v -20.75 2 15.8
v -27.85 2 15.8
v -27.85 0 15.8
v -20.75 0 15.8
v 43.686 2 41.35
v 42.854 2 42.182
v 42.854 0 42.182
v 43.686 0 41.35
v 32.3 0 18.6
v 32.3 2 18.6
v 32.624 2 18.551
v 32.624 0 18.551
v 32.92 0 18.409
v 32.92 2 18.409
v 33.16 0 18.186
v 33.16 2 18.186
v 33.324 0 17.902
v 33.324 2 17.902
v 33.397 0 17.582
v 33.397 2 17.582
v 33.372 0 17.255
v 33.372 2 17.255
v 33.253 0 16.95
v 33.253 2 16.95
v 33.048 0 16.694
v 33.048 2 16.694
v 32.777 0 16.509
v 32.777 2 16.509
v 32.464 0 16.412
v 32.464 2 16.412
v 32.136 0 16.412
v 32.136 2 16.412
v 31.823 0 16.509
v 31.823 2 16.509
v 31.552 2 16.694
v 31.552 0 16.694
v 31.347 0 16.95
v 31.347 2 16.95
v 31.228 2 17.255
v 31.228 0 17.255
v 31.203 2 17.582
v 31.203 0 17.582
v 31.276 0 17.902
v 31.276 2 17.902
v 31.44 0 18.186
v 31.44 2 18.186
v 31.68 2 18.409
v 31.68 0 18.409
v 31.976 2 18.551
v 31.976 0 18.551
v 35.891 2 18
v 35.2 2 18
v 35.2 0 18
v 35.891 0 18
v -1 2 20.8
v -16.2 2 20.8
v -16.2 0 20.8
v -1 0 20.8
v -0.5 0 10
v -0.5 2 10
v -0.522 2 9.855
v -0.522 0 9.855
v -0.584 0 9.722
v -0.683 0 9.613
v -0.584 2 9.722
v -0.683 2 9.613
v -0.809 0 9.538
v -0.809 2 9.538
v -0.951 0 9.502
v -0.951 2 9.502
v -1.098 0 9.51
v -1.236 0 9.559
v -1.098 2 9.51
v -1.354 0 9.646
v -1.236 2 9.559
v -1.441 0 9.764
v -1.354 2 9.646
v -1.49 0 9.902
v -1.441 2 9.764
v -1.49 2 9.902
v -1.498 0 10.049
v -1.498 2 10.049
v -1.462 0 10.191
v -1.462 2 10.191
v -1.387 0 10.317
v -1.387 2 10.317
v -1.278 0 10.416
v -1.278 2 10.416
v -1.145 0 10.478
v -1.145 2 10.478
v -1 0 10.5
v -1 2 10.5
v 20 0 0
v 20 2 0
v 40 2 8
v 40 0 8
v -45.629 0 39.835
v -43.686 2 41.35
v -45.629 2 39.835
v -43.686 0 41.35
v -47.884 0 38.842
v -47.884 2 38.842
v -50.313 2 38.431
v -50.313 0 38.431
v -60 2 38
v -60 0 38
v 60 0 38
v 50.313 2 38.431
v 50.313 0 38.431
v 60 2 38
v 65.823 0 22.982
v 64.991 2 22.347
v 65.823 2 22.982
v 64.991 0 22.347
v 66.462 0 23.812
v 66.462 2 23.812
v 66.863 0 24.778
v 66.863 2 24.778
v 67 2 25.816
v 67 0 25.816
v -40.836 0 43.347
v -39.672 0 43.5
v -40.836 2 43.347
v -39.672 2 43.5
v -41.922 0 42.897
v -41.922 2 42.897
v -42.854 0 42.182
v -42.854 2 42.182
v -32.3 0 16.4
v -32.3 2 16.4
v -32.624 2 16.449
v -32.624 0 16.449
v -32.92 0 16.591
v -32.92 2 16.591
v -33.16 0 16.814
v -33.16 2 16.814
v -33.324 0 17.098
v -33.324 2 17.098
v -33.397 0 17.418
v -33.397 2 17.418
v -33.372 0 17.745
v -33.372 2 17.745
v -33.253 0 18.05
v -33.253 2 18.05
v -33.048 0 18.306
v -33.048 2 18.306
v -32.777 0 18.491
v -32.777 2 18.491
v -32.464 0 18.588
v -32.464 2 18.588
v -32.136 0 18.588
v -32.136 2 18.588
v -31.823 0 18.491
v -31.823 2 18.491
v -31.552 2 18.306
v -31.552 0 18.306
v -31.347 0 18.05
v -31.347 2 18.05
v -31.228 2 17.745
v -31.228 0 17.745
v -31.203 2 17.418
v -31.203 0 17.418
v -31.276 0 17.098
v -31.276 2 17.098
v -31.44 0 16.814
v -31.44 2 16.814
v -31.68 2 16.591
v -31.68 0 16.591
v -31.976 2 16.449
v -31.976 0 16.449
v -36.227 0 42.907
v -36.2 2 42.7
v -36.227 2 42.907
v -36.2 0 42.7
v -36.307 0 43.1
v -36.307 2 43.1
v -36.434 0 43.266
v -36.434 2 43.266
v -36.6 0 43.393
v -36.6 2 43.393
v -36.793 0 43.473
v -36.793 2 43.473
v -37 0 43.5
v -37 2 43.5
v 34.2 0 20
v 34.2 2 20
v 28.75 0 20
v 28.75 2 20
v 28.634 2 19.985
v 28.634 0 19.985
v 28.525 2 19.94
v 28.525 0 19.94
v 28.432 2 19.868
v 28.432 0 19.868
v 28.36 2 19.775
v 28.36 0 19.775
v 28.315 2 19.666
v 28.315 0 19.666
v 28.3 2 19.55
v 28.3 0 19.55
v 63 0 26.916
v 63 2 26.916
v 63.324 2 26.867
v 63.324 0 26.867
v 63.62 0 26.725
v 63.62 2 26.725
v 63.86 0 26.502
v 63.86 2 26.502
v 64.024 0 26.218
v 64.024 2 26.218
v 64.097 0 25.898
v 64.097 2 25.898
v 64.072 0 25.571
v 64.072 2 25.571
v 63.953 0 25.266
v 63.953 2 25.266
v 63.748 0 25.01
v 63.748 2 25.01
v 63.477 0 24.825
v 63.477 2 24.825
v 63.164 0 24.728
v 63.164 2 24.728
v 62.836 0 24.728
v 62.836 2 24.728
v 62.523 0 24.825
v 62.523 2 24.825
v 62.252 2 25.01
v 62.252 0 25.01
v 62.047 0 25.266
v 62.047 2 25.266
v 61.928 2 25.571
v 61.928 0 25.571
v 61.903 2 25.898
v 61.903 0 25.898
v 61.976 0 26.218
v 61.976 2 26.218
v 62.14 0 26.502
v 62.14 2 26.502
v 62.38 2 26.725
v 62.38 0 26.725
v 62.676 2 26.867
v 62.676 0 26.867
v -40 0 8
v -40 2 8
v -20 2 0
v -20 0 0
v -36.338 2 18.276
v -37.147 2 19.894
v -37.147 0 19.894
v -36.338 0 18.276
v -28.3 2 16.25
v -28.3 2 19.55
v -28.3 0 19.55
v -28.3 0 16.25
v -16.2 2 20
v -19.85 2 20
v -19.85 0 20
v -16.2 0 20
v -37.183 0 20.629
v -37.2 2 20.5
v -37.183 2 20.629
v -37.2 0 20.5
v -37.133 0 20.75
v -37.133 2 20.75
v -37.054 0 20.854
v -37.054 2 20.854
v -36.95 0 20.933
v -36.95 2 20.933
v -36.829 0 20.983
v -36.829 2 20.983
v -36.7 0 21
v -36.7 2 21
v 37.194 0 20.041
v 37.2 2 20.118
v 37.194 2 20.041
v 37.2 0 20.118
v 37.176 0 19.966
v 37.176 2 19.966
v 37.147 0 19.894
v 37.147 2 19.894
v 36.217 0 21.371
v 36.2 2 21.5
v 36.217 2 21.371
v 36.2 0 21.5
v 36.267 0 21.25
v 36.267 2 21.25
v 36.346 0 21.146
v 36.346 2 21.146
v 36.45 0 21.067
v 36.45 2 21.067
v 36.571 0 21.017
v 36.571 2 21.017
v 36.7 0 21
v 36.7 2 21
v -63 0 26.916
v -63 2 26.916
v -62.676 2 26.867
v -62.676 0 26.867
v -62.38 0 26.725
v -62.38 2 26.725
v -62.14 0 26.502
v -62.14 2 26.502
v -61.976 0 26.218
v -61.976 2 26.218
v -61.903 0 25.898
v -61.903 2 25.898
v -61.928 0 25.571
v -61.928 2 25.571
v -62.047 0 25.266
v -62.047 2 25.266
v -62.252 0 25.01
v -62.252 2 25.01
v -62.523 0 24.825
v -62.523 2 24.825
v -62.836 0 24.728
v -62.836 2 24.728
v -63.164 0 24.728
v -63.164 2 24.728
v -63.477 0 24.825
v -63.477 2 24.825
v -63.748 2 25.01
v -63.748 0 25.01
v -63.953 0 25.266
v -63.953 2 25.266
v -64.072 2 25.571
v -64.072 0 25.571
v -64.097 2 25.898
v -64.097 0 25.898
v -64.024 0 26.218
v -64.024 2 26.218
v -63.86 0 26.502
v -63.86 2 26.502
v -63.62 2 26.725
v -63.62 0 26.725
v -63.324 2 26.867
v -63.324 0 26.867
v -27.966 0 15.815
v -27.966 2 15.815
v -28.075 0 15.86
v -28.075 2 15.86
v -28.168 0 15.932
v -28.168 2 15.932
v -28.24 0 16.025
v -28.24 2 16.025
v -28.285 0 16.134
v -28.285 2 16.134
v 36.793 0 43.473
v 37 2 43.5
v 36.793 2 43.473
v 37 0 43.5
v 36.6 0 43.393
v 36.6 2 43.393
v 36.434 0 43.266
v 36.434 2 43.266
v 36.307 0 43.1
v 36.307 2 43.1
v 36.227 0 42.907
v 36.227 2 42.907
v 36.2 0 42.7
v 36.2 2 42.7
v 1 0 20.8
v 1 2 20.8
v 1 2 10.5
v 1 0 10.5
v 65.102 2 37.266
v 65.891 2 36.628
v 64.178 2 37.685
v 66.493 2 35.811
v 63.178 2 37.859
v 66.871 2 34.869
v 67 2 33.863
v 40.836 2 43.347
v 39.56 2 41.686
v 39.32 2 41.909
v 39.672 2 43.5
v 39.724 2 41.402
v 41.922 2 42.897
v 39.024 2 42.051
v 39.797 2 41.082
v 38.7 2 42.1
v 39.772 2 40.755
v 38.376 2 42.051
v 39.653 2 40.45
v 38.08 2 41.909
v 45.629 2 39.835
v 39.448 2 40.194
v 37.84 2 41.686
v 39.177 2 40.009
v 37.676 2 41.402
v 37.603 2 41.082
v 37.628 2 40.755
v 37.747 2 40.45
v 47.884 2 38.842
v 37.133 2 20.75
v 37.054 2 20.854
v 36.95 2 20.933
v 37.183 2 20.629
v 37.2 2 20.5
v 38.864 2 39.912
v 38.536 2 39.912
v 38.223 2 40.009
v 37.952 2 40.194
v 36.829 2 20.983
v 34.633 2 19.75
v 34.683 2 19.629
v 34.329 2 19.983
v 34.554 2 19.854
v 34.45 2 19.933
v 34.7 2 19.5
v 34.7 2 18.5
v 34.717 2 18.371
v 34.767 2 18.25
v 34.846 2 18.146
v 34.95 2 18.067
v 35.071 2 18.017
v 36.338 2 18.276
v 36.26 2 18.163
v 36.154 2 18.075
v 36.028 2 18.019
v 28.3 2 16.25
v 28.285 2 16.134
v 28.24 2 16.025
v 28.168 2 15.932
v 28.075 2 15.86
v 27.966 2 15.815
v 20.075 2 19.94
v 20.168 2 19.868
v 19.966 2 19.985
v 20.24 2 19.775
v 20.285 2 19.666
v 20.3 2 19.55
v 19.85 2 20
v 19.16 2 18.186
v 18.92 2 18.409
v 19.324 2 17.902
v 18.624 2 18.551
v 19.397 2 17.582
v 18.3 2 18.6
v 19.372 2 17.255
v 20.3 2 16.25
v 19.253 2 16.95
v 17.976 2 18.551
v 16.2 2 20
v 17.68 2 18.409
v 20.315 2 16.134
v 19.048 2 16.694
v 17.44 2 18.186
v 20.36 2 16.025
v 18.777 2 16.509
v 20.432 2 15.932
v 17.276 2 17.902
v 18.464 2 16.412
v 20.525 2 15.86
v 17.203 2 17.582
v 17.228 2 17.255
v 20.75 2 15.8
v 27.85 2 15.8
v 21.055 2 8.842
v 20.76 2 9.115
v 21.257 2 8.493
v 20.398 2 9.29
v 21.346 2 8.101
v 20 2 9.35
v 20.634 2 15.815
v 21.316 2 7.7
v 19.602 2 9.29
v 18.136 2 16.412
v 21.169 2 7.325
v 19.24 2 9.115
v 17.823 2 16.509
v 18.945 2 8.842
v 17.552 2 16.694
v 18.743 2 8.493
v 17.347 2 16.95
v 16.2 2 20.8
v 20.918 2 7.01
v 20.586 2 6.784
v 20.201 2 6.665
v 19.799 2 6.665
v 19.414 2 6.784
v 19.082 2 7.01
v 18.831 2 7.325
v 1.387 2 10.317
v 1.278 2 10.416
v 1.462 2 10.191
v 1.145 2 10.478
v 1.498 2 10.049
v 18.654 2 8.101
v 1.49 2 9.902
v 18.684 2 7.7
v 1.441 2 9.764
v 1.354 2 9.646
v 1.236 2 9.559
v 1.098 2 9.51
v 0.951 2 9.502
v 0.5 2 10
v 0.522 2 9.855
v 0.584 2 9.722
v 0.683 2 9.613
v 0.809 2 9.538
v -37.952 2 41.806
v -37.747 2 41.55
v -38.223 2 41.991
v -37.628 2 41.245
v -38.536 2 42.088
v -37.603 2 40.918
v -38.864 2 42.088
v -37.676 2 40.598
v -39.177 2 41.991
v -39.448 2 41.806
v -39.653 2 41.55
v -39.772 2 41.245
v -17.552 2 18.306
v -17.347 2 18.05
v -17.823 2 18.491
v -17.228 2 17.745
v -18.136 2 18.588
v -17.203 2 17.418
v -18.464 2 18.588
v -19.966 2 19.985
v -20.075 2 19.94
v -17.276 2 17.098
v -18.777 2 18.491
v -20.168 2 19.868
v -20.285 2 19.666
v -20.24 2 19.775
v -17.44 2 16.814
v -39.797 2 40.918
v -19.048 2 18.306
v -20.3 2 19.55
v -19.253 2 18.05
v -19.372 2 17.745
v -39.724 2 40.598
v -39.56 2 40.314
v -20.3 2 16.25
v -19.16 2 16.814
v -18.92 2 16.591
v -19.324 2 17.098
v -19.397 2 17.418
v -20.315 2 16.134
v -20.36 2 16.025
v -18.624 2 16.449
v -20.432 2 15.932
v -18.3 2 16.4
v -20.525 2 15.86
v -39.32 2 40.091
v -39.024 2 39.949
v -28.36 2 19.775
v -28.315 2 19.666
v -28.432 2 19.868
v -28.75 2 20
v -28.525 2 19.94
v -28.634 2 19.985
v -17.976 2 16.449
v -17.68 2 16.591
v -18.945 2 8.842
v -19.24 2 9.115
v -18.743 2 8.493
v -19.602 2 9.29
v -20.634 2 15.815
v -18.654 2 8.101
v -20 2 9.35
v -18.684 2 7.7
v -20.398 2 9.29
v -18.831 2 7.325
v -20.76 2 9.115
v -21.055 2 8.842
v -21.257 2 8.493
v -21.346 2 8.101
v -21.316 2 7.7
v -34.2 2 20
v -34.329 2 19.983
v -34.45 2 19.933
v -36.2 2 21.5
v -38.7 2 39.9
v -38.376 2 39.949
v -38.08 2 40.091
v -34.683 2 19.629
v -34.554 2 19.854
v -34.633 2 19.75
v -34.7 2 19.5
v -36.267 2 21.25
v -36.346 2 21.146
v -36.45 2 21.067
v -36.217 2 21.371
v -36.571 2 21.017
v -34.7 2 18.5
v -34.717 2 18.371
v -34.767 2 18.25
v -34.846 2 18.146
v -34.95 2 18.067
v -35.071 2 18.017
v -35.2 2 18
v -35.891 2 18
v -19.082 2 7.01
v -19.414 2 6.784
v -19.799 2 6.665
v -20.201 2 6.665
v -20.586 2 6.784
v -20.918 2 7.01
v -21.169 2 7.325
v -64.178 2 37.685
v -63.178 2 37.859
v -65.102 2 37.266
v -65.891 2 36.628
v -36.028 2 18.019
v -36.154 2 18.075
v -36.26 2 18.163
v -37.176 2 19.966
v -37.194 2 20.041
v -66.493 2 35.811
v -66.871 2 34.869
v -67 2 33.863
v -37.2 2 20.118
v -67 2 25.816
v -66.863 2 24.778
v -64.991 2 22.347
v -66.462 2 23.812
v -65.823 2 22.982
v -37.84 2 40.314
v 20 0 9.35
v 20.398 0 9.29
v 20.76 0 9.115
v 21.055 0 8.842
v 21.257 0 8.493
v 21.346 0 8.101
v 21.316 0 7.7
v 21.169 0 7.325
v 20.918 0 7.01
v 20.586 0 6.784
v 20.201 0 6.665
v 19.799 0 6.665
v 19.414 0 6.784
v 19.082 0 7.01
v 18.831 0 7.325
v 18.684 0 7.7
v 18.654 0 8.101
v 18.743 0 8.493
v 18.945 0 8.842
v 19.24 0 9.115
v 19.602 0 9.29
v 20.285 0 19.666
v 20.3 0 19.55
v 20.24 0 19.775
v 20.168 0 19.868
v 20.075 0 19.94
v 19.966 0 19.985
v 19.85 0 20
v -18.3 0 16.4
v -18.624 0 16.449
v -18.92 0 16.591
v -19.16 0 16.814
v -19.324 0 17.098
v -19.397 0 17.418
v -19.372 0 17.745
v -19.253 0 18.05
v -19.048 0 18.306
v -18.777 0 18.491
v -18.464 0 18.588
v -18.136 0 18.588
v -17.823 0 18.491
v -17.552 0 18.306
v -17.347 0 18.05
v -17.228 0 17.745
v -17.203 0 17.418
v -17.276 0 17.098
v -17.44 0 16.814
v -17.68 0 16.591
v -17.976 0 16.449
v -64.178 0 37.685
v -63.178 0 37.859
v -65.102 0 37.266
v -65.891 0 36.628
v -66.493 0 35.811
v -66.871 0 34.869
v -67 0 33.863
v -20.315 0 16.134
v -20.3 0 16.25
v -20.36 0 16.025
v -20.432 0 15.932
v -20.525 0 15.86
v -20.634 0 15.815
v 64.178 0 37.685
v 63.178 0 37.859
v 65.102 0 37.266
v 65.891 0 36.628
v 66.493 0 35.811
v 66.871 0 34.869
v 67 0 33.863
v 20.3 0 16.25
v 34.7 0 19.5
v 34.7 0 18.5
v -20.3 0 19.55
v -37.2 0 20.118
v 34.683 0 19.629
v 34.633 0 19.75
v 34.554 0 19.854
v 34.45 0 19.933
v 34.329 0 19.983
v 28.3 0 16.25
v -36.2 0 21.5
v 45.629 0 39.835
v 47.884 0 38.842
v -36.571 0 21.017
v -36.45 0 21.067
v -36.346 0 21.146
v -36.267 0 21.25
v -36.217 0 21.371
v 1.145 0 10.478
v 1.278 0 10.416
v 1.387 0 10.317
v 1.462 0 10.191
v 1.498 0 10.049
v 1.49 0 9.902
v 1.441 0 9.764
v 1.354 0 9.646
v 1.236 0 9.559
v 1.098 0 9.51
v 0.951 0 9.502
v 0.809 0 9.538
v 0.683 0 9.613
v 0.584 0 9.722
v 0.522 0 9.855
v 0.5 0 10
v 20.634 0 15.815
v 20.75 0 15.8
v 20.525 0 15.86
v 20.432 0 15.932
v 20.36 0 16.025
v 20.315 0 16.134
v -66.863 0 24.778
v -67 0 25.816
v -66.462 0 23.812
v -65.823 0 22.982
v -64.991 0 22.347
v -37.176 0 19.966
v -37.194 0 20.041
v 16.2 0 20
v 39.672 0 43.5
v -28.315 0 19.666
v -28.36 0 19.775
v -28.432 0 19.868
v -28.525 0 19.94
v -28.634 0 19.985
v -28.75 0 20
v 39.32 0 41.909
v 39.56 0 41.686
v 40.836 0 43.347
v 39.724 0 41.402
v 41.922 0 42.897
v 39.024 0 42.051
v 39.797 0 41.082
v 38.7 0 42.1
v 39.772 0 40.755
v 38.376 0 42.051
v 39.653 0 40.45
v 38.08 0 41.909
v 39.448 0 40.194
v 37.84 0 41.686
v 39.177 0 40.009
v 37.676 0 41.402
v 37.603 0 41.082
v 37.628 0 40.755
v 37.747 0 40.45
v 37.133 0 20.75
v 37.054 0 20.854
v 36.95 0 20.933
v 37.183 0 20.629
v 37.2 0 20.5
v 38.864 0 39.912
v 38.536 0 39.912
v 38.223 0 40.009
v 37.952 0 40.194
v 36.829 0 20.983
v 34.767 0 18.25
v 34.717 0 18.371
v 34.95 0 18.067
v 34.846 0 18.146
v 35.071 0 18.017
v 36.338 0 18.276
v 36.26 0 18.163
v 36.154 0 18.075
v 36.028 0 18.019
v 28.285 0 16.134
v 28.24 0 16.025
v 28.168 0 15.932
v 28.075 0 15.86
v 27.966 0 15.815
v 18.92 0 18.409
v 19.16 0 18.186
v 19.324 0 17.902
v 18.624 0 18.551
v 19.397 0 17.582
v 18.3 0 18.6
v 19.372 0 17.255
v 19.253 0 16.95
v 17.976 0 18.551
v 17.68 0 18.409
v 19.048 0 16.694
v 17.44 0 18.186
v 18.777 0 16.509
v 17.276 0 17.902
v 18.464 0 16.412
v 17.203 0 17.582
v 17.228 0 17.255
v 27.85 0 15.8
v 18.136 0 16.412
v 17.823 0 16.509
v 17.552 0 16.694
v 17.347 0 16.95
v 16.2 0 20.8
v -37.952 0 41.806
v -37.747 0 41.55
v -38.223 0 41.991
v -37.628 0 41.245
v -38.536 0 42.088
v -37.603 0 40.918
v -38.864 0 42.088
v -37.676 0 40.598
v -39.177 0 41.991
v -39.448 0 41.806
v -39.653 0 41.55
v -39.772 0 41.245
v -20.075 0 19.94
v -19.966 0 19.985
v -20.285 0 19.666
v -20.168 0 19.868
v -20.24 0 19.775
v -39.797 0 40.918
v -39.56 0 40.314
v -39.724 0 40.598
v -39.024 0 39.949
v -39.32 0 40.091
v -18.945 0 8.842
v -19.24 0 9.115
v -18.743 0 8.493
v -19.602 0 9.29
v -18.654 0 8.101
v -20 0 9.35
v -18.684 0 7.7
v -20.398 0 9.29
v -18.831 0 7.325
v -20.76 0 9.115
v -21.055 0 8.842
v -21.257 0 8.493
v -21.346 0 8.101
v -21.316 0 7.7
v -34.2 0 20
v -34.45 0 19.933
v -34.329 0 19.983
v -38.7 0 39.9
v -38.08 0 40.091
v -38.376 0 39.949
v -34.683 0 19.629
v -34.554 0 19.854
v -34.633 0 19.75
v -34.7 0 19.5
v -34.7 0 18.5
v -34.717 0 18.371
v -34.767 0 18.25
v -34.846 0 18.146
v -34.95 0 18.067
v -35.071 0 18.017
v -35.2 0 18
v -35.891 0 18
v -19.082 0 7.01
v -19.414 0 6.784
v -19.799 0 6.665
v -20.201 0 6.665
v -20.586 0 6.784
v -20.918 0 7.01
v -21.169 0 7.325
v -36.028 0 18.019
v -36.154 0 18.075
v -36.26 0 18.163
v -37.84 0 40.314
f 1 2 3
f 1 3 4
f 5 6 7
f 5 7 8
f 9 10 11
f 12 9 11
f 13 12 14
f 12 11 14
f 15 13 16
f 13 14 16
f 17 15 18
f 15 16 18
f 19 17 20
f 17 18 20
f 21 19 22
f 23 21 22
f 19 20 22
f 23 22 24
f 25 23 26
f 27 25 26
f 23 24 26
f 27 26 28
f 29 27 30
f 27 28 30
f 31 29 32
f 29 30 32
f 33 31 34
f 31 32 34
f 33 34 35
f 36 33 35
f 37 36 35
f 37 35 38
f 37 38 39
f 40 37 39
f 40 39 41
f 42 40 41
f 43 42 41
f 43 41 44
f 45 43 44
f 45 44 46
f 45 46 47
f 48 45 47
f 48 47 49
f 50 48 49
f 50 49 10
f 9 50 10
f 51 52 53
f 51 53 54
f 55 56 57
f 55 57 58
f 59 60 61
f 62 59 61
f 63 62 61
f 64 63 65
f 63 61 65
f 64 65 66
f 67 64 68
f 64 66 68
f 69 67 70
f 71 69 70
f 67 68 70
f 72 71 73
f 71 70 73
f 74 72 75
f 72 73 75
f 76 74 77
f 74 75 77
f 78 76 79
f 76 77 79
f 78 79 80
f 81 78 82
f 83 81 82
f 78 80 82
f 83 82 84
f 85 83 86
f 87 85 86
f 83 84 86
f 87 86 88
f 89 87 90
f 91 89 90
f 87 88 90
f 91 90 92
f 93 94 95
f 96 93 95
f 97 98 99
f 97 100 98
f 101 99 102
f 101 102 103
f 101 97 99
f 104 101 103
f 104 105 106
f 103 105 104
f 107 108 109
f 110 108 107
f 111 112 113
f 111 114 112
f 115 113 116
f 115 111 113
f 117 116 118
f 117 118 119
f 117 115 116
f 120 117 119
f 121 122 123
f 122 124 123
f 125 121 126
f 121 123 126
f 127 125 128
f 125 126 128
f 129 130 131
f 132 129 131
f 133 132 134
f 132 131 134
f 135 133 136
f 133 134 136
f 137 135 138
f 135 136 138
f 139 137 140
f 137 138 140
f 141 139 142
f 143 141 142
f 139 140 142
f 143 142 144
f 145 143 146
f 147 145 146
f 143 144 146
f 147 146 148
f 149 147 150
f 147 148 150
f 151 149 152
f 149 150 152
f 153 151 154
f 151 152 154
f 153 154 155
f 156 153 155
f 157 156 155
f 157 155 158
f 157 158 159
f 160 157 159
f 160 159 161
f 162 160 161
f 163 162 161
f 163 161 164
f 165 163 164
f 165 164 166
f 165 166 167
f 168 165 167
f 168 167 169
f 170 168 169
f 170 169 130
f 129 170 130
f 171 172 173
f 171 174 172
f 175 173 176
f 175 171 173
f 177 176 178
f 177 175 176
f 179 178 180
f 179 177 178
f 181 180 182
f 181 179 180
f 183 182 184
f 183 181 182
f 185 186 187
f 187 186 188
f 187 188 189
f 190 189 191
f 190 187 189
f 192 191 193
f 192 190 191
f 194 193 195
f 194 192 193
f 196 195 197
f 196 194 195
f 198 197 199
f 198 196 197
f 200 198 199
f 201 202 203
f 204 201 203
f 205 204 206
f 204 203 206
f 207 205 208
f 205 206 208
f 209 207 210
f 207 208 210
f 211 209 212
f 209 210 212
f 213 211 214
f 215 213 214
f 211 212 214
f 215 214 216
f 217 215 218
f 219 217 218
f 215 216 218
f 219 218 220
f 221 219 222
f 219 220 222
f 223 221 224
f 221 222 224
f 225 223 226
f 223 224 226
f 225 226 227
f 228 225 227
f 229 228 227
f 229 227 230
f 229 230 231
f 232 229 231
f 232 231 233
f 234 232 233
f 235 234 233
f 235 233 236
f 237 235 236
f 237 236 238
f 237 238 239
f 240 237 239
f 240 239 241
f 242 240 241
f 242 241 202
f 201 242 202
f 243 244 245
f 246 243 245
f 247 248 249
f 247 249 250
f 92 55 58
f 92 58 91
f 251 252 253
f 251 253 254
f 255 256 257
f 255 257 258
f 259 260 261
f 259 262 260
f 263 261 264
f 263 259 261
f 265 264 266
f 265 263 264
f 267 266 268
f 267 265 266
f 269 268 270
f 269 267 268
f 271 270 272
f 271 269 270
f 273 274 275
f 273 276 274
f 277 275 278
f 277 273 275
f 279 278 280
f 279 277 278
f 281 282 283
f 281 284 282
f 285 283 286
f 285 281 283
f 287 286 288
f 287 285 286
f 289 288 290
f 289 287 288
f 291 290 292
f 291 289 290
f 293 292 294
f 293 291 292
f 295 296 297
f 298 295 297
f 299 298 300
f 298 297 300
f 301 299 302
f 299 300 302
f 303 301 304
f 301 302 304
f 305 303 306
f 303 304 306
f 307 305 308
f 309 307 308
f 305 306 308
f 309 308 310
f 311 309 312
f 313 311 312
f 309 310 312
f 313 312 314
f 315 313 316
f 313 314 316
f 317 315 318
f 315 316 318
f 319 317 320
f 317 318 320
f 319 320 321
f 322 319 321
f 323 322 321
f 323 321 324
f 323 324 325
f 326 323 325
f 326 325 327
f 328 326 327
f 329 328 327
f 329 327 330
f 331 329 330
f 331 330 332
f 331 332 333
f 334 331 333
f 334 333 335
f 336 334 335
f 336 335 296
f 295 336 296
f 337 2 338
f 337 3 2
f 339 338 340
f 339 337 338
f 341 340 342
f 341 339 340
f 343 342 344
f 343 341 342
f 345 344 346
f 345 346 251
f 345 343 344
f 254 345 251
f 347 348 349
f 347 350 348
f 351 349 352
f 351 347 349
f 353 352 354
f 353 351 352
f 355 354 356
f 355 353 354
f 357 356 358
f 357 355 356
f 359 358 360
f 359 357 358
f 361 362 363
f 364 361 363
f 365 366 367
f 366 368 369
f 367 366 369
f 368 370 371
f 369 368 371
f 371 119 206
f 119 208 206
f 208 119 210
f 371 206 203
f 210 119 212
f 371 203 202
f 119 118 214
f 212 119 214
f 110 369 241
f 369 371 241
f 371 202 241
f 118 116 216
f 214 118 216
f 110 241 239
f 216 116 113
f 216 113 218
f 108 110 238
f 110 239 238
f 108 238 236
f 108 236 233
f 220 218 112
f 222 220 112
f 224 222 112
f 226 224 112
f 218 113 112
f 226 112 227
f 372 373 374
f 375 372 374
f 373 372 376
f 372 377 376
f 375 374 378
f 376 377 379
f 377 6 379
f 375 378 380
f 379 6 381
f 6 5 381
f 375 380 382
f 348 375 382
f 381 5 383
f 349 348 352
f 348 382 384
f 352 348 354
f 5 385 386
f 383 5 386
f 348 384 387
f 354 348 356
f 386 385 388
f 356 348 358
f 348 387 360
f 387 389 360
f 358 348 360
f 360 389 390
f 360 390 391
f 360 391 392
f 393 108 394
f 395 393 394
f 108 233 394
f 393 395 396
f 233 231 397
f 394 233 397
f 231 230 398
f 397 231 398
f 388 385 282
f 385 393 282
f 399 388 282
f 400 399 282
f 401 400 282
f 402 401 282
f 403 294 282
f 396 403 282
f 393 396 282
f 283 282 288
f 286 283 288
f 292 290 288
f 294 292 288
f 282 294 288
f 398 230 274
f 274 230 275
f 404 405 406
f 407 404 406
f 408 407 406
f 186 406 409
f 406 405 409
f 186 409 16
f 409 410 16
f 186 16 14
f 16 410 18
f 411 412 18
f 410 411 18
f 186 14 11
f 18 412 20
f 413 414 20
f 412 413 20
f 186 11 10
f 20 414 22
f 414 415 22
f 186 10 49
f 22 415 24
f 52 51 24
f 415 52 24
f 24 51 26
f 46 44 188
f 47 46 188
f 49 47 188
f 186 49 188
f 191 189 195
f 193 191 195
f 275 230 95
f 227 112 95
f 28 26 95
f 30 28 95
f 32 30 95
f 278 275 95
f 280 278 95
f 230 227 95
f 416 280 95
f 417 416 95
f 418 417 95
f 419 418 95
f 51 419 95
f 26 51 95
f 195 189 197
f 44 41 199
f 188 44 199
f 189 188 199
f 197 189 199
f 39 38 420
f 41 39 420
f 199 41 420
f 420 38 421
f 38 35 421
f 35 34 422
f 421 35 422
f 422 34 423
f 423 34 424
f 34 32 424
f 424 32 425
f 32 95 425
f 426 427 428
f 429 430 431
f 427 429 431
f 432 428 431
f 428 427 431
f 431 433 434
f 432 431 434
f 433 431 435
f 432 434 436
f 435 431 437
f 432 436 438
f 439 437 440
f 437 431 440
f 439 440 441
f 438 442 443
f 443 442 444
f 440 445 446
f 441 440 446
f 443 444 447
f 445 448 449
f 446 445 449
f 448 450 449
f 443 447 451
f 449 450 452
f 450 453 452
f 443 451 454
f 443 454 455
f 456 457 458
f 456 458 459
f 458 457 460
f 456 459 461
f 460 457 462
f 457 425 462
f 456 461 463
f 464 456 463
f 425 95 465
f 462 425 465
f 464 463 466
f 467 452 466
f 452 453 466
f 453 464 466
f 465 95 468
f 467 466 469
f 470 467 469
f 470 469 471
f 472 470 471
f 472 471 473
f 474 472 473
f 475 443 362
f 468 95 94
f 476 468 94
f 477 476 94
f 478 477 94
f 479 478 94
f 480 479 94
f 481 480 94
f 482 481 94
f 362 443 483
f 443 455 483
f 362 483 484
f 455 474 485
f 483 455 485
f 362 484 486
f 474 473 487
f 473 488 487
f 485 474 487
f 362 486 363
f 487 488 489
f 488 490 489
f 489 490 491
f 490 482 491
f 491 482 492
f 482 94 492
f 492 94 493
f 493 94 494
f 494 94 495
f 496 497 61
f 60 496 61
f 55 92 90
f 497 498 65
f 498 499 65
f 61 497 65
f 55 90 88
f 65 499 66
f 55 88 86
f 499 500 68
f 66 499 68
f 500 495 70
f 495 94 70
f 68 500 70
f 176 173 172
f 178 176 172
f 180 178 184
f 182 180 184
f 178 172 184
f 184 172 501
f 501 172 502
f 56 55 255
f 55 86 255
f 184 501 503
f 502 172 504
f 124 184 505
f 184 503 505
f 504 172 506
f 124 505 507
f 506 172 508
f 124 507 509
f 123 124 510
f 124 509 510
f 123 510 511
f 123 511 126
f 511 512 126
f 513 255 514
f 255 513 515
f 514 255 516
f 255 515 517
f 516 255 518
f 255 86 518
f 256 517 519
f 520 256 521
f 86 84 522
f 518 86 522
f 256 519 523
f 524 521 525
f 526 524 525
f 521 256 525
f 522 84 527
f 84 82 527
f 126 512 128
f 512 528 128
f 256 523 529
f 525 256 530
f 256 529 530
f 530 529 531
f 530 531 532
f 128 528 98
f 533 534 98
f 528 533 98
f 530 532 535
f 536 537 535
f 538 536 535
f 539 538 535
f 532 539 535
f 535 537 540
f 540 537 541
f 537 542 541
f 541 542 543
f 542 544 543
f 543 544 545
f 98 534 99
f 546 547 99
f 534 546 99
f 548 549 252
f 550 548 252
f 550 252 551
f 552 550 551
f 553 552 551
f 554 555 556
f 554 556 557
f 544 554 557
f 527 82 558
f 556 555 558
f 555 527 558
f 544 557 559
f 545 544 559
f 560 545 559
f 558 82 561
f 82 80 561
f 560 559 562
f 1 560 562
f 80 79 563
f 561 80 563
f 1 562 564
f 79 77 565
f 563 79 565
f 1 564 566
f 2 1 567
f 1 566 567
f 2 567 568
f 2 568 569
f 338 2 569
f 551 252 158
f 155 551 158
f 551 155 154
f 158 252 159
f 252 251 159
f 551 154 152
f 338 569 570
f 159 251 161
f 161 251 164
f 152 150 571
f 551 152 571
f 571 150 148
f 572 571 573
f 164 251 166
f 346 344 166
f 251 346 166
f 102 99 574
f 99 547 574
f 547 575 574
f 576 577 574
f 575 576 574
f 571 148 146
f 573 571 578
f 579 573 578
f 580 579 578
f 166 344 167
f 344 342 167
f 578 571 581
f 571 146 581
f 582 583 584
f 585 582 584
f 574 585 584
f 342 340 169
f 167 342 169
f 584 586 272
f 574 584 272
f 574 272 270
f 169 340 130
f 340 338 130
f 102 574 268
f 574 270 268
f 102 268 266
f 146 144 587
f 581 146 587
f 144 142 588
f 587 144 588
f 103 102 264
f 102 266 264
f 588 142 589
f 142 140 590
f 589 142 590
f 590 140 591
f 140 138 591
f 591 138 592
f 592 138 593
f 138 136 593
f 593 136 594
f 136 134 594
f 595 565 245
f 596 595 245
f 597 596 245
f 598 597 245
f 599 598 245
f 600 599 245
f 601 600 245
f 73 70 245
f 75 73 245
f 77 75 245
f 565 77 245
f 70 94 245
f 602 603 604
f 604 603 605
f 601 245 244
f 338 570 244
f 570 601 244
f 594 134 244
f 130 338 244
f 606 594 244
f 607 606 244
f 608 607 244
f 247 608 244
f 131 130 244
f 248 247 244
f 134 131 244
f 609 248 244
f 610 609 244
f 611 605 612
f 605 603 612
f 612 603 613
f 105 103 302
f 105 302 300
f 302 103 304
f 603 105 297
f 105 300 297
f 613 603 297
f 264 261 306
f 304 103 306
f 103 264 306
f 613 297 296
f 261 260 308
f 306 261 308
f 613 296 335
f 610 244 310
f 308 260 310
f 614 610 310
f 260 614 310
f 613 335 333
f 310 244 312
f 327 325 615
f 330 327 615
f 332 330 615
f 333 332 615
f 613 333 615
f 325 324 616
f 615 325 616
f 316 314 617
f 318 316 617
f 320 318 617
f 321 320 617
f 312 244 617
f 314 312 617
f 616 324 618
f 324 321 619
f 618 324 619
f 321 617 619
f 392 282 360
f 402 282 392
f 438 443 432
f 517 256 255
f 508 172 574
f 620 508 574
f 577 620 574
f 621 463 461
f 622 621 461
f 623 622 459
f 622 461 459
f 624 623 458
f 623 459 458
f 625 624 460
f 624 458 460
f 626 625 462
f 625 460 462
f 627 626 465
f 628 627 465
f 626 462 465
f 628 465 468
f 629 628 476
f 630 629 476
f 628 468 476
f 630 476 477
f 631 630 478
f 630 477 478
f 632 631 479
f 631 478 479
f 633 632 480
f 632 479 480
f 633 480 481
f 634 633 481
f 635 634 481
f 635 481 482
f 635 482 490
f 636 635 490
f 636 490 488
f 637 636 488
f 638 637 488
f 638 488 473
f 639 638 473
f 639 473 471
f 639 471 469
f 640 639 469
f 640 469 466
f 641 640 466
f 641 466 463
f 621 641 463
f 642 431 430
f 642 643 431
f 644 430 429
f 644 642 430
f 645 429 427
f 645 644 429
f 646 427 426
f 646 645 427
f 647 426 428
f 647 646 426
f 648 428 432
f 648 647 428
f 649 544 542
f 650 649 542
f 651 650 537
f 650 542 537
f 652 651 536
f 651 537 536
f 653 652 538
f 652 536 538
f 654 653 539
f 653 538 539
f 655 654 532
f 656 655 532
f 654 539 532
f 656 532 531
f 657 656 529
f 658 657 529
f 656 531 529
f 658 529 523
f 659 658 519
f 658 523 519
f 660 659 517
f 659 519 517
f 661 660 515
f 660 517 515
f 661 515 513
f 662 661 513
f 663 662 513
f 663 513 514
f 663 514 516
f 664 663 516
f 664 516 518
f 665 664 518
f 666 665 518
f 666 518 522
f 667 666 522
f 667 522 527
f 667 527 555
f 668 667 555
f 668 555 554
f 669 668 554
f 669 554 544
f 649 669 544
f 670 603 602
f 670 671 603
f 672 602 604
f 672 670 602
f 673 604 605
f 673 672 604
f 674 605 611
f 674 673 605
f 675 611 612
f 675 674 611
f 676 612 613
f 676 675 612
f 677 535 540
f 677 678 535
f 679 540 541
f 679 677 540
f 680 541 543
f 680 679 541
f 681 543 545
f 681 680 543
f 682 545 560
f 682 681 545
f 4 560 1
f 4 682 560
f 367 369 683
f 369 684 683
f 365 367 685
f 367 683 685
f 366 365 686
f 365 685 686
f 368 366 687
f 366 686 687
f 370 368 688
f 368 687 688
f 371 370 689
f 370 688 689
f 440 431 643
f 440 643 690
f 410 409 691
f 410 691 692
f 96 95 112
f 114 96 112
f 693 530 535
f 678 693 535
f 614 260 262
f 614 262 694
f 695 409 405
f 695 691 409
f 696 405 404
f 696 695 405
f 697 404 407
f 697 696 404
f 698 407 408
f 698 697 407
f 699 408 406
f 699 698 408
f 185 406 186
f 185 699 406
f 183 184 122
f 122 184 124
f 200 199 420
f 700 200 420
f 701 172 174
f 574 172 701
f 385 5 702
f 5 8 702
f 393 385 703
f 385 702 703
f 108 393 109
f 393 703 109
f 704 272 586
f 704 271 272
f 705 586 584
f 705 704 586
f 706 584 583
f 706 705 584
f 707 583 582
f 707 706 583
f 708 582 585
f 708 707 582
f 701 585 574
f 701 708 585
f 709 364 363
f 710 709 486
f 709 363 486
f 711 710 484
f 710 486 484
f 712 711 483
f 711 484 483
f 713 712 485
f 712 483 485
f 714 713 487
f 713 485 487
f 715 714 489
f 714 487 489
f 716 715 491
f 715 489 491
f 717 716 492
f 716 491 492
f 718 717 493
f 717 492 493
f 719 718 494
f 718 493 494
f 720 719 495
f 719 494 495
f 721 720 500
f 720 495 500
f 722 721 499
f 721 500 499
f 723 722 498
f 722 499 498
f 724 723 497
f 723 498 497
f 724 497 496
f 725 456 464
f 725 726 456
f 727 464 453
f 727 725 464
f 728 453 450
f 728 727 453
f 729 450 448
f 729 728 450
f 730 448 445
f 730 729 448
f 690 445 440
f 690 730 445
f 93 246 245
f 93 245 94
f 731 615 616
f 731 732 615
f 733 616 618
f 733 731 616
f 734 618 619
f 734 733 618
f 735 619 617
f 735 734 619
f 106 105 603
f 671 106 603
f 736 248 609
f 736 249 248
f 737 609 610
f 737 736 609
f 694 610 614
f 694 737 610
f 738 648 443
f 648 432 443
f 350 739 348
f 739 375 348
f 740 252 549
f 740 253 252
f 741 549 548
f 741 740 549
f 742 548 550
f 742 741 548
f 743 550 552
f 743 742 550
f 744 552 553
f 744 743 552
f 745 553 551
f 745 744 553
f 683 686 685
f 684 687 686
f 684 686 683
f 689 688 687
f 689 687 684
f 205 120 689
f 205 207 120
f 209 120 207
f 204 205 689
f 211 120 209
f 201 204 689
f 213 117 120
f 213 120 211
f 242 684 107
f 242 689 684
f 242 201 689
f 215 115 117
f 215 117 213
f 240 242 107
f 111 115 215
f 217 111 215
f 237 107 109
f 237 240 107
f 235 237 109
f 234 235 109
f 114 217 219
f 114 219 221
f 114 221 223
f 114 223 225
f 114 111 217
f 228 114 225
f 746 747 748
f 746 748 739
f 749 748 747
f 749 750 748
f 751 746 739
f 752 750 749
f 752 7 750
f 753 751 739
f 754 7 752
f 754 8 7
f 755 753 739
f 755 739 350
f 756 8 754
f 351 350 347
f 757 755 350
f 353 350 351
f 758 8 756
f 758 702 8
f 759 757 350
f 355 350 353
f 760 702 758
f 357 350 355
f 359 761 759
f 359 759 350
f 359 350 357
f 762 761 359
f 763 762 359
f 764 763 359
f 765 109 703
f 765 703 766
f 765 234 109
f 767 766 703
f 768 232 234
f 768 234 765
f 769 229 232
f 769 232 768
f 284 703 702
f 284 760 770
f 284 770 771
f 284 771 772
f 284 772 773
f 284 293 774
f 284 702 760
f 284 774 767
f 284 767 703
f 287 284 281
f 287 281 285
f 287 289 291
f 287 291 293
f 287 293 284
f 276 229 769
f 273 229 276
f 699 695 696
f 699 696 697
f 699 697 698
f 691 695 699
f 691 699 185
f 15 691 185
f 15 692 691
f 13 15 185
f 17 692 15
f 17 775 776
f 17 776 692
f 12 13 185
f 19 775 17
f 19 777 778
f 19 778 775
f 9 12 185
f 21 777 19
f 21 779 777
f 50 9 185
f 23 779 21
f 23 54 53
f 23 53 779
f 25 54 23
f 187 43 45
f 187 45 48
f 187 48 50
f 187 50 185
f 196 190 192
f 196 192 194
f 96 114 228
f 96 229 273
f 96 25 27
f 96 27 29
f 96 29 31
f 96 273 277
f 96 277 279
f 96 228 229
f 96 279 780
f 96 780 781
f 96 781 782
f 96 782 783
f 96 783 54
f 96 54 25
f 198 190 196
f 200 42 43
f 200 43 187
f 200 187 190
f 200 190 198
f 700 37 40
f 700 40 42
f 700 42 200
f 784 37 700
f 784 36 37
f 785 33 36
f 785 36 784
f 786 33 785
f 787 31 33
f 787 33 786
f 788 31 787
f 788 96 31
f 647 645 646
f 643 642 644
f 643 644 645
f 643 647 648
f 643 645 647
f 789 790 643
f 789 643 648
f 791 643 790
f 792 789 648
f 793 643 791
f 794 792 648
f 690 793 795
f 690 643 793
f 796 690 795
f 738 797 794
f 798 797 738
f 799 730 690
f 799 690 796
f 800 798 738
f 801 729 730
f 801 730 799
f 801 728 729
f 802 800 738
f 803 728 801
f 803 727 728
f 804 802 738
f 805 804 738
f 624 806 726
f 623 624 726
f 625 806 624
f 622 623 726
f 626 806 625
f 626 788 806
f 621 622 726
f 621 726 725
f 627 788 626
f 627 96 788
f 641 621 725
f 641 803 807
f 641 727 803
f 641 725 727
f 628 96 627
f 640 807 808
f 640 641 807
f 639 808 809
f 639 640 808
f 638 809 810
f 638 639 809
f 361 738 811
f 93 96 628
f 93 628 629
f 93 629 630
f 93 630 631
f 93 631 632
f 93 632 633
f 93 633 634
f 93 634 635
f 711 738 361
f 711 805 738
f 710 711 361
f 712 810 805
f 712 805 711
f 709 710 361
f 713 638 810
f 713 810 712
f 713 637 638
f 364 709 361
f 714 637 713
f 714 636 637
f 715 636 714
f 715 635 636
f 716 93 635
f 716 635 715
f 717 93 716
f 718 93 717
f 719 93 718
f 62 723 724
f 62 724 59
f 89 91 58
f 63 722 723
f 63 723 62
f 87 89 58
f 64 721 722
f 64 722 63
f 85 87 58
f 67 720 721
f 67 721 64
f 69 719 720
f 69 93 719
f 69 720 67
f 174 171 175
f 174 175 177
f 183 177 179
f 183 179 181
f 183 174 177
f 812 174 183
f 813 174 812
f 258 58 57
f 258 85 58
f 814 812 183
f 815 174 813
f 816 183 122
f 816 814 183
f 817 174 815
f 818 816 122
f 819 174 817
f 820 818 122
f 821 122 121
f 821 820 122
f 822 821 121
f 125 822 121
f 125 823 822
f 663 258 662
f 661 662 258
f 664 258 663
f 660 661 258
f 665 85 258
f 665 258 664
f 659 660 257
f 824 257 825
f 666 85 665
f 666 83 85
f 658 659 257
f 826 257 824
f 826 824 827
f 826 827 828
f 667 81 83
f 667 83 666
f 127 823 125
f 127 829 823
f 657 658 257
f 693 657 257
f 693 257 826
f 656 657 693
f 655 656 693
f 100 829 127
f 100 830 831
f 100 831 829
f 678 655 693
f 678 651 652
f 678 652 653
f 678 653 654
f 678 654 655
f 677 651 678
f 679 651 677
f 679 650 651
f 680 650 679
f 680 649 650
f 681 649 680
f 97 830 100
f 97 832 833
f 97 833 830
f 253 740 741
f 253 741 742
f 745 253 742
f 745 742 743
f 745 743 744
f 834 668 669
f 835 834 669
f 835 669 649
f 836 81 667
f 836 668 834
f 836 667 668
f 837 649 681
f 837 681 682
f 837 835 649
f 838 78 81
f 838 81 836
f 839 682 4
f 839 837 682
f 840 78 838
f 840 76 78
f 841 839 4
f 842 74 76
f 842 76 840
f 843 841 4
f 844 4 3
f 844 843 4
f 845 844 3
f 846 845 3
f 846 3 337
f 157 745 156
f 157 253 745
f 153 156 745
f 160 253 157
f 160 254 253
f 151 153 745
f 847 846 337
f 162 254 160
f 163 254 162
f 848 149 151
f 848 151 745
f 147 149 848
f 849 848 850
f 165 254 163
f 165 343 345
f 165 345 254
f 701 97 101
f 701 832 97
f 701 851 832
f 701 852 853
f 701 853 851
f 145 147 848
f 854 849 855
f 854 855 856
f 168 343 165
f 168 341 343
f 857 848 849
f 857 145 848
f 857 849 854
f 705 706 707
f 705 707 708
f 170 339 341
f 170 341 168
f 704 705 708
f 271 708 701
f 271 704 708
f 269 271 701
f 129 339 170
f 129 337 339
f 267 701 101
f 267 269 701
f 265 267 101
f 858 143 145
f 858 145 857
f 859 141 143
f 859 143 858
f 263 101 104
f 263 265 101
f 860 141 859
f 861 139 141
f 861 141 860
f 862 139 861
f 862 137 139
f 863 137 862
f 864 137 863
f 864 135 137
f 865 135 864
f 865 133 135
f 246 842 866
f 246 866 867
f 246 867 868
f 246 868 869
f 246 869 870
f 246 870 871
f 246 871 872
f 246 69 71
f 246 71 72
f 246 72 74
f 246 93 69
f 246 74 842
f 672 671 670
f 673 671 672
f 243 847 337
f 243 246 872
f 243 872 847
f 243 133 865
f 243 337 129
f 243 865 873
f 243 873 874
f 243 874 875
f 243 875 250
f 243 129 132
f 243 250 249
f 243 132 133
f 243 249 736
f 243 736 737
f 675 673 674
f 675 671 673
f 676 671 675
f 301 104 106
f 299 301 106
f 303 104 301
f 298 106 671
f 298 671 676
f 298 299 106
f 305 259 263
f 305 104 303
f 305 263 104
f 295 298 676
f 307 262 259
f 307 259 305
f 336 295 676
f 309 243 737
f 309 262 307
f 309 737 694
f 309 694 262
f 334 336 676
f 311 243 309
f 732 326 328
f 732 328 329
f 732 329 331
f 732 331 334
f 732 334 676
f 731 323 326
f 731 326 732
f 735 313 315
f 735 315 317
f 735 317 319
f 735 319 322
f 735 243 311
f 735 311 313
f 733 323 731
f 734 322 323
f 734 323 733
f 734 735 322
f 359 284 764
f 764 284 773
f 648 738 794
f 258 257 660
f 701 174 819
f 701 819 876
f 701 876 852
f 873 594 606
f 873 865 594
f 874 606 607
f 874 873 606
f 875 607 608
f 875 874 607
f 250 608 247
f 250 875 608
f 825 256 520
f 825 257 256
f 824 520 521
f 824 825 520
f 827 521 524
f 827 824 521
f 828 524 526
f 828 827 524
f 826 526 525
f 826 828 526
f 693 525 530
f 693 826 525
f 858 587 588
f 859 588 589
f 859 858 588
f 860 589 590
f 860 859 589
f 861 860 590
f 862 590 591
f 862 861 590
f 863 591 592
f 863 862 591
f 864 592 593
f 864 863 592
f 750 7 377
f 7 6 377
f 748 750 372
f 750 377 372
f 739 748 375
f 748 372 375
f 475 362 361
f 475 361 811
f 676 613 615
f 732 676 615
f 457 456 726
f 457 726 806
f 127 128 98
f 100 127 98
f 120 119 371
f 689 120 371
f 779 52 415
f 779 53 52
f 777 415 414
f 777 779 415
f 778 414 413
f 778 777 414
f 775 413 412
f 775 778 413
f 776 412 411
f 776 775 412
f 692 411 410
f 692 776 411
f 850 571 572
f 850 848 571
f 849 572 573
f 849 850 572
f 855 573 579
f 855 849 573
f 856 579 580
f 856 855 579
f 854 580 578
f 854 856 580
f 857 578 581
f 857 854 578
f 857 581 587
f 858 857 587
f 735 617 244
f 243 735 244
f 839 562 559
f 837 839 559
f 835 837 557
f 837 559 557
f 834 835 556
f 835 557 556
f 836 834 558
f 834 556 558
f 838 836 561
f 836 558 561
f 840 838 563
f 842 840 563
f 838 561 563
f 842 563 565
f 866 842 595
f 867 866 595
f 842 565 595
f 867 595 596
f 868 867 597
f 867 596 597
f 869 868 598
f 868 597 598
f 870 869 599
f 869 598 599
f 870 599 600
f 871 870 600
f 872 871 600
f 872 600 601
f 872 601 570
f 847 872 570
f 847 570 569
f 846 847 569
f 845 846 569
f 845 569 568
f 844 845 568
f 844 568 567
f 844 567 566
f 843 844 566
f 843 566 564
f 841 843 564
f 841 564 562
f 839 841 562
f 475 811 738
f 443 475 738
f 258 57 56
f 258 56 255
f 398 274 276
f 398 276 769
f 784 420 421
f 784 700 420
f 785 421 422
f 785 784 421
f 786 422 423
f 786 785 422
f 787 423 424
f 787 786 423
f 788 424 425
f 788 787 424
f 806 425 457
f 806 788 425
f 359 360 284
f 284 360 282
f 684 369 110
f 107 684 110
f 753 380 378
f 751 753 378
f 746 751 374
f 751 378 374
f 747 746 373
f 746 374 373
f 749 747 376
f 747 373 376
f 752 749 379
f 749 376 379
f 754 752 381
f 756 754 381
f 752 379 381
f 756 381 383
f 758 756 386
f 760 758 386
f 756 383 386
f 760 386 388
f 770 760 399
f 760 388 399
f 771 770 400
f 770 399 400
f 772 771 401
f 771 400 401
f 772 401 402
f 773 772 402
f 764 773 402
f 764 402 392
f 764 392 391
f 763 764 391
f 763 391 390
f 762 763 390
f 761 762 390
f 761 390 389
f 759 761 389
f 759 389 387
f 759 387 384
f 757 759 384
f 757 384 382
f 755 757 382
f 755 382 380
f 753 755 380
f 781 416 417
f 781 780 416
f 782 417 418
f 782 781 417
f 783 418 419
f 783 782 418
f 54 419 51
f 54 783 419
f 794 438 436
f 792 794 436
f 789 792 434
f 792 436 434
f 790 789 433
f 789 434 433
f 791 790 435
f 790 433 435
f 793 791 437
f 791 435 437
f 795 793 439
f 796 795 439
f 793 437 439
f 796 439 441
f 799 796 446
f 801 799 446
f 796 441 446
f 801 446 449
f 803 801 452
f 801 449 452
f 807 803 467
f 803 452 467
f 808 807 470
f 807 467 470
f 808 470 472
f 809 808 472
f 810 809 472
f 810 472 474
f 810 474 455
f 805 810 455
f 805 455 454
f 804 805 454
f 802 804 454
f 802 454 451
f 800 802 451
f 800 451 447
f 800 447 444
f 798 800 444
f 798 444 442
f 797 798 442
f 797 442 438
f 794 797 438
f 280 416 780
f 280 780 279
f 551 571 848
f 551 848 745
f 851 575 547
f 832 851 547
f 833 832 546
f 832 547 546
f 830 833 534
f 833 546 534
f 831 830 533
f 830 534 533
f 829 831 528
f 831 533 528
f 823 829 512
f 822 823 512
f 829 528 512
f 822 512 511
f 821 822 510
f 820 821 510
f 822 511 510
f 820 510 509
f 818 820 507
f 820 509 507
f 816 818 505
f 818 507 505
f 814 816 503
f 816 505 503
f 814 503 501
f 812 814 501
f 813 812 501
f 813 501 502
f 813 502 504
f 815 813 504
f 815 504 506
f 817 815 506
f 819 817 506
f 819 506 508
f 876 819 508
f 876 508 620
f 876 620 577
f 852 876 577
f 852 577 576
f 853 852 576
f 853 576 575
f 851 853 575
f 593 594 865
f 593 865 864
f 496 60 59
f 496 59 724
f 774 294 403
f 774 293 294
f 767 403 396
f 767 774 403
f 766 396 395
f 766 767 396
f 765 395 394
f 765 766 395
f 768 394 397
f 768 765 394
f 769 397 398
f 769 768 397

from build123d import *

# Parameters (mm, degrees)
EXTRUDE_1_DEPTH      = 2
CUT_EXTRUDE_1_DEPTH  = 10
SKETCH_3_W           = 2
SKETCH_3_H           = 10
CUT_EXTRUDE_2_DEPTH  = 10
CUT_EXTRUDE_3_DEPTH  = 10
SKETCH_5_W           = 23
SKETCH_5_H           = 22.484633815
CUT_EXTRUDE_4_DEPTH  = 10
SKETCH_6_W           = 32.4
SKETCH_6_H           = 0.8
EXTRUDE_2_DEPTH      = 2
SKETCH_7_R           = 1.1
CUT_EXTRUDE_5_DEPTH  = 10
EXTRUDE_3_DEPTH      = 2
SKETCH_9_R           = 1.1
CUT_EXTRUDE_6_DEPTH  = 10
CHAMFER_2_SIZE       = 5
CHAMFER_2_SIZE_2     = 5.237723549
FILLET_2_R           = 10
FILLET_3_R           = 4.5
SKETCH_10_W          = 1.5
SKETCH_10_H          = 2
CUT_EXTRUDE_7_DEPTH  = 10
SKETCH_11_R          = 1.35
CUT_EXTRUDE_8_DEPTH  = 10
SKETCH_12_W          = 8
SKETCH_12_H          = 4.2
CUT_EXTRUDE_9_DEPTH  = 10
FILLET_5_R           = 0.45
CUT_EXTRUDE_10_DEPTH = 10
FILLET_6_R           = 0.5
FILLET_7_R           = 0.8
SKETCH_14_R          = 0.5
CUT_EXTRUDE_11_DEPTH = 10
SKETCH_15_W          = 2
SKETCH_15_H          = 0.8
CUT_EXTRUDE_12_DEPTH = 10
EXTRUDE_4_DEPTH      = 2
FILLET_8_R           = 4
SKETCH_17_R          = 1.1
CUT_EXTRUDE_13_DEPTH = 10


# Some blends are built 0.0001 mm under size
with BuildPart() as part:
    # 草图1 → 凸台-拉伸1 (new body)
    with BuildSketch(Plane(origin=(0, 0, 0), x_dir=(1, 0, 0), z_dir=(0, 1, 0))):
        Polygon((-20, 0), (20, 0), (60, -20), (60, -40), (0, -40), (-60, -40), (-60, -20), align=None)
    extrude(amount=EXTRUDE_1_DEPTH)

    # 草图2 → 切除-拉伸1 (cut)
    with BuildSketch(Plane(origin=(0, 2, 0), x_dir=(1, 0, 0), z_dir=(0, 1, 0))):
        Polygon((0, -20), (13.2, -20), (13.2, -40), (-13.2, -40), (-13.2, -20), align=None)
    extrude(amount=-CUT_EXTRUDE_1_DEPTH, mode=Mode.SUBTRACT)

    # 草图3 → 切除-拉伸2 (cut)
    with BuildSketch(Plane(origin=(0, 2, 0), x_dir=(1, 0, 0), z_dir=(0, 1, 0))):
        with Locations((0, -15)):
            Rectangle(SKETCH_3_W, SKETCH_3_H)
    extrude(amount=-CUT_EXTRUDE_2_DEPTH, mode=Mode.SUBTRACT)

    # 草图4 → 切除-拉伸3 (cut)
    with BuildSketch(Plane(origin=(0, 2, 0), x_dir=(1, 0, 0), z_dir=(0, 1, 0))):
        Polygon((-60, -40), (-60, -38), (-15, -40), align=None)
        Polygon((60, -40), (15, -40), (60, -38), align=None)
    extrude(amount=-CUT_EXTRUDE_3_DEPTH, mode=Mode.SUBTRACT)

    # 草图5 → 切除-拉伸4 (cut)
    with BuildSketch(Plane(origin=(0, 2, 0), x_dir=(1, 0, 0), z_dir=(0, 1, 0))):
        with Locations((24.7, -31.242316908)):
            Rectangle(SKETCH_5_W, SKETCH_5_H)
        with Locations((-24.7, -31.242316908)):
            Rectangle(SKETCH_5_W, SKETCH_5_H)
    extrude(amount=-CUT_EXTRUDE_4_DEPTH, mode=Mode.SUBTRACT)

    # 草图6 → 凸台-拉伸2 (add)
    with BuildSketch(Plane(origin=(0, 2, 0), x_dir=(1, 0, 0), z_dir=(0, 1, 0))):
        with Locations((0, -20.4)):
            Rectangle(SKETCH_6_W, SKETCH_6_H)
    extrude(amount=-EXTRUDE_2_DEPTH)

    # 草图7 → 切除-拉伸5 (cut)
    with BuildSketch(Plane(origin=(0, 2, 0), x_dir=(1, 0, 0), z_dir=(0, 1, 0))):
        with Locations(Location((32.3, -17.5, 0), (0, 0, 270))):
            Circle(SKETCH_7_R)
        with Locations(Location((18.3, -17.5, 0), (0, 0, 270))):
            Circle(SKETCH_7_R)
        with Locations(Location((-18.3, -17.5, 0), (0, 0, 90))):
            Circle(SKETCH_7_R)
        with Locations(Location((-32.3, -17.5, 0), (0, 0, 90))):
            Circle(SKETCH_7_R)
    extrude(amount=-CUT_EXTRUDE_5_DEPTH, mode=Mode.SUBTRACT)

    # 草图8 → 凸台-拉伸3 (add)
    with BuildSketch(Plane(origin=(0, 2, 0), x_dir=(1, 0, 0), z_dir=(0, 1, 0))):
        Polygon((-36.2, -43.5), (-36.2, -40), (-36.2, -35.5), (-41.2, -35.5), (-41.2, -43.5), align=None)
        Polygon((36.2, -40), (36.2, -35.5), (41.2, -35.5), (41.2, -43.5), (36.2, -43.5), align=None)
    extrude(amount=-EXTRUDE_3_DEPTH)

    # 草图9 → 切除-拉伸6 (cut)
    with BuildSketch(Plane(origin=(0, 2, 0), x_dir=(1, 0, 0), z_dir=(0, 1, 0))):
        with Locations(Location((38.7, -41, 0), (0, 0, 270))):
            Circle(SKETCH_9_R)
        with Locations(Location((-38.7, -41, 0), (0, 0, 90))):
            Circle(SKETCH_9_R)
    extrude(amount=-CUT_EXTRUDE_6_DEPTH, mode=Mode.SUBTRACT)

    # 倒角2
    # the kernel refuses this chamfer: 5.237723549, 5 mm, written as the material it adds along each edge
    with BuildSketch(Plane(origin=(-41.2, 2, 38.835555556), x_dir=(0.02876451379188079, 0, 0.9995862157644616), z_dir=(0, -1, 0))) as chamfer_2_piece_1_section:
        Polygon((CHAMFER_2_SIZE * 0.999586215764, CHAMFER_2_SIZE * 0.0287645137919), (-CHAMFER_2_SIZE_2 * 0.073118387756, CHAMFER_2_SIZE_2 * 0.997323268169), (0, 0), align=None)
    chamfer_2_piece_1 = extrude(amount=2, mode=Mode.PRIVATE)
    chamfer_2_piece_1 = split(chamfer_2_piece_1, bisect_by=Plane(origin=(-42.946846358, 1, 43.5), z_dir=(0, 0, -1)), keep=Keep.TOP, mode=Mode.PRIVATE)
    add(chamfer_2_piece_1)
    with BuildSketch(Plane(origin=(41.2, 2, 38.835555556), x_dir=(-0.028764513791882163, 0, 0.9995862157644615), z_dir=(0, -1, 0))) as chamfer_2_piece_2_section:
        Polygon((CHAMFER_2_SIZE * 0.999586215764, -CHAMFER_2_SIZE * 0.0287645137919), (-CHAMFER_2_SIZE_2 * 0.073118387756, -CHAMFER_2_SIZE_2 * 0.997323268169), (0, 0), align=None)
    chamfer_2_piece_2 = extrude(amount=2, mode=Mode.PRIVATE)
    chamfer_2_piece_2 = split(chamfer_2_piece_2, bisect_by=Plane(origin=(42.946846358, 1, 43.5), z_dir=(0, 0, -1)), keep=Keep.TOP, mode=Mode.PRIVATE)
    add(chamfer_2_piece_2)

    # 圆角2
    fillet_2_edges = [part.edges().sort_by_distance(p)[0] for p in [
        (-46.43255814, 1, 38.602997416),
        (46.43255814, 1, 38.602997416),
    ]]
    fillet(fillet_2_edges, radius=FILLET_2_R)

    # 圆角3
    fillet_3_edges = [part.edges().sort_by_distance(p)[0] for p in [
        (-41.535555556, 1, 43.5),
        (41.535555556, 1, 43.5),
    ]]
    fillet(fillet_3_edges, radius=FILLET_3_R)

    # 草图10 → 切除-拉伸7 (cut)
    with BuildSketch(Plane(origin=(0, 2, 0), x_dir=(1, 0, 0), z_dir=(0, 1, 0))):
        with Locations((35.45, -19)):
            Rectangle(SKETCH_10_W, SKETCH_10_H)
        with Locations((-35.45, -19)):
            Rectangle(SKETCH_10_W, SKETCH_10_H)
    extrude(amount=-CUT_EXTRUDE_7_DEPTH, mode=Mode.SUBTRACT)

    # 草图11 → 切除-拉伸8 (cut)
    with BuildSketch(Plane(origin=(0, 2, 0), x_dir=(1, 0, 0), z_dir=(0, 1, 0))):
        with Locations(Location((20, -8, 0), (0, 0, 270))):
            Circle(SKETCH_11_R)
        with Locations(Location((-20, -8, 0), (0, 0, 270))):
            Circle(SKETCH_11_R)
    extrude(amount=-CUT_EXTRUDE_8_DEPTH, mode=Mode.SUBTRACT)

    # 草图12 → 切除-拉伸9 (cut)
    with BuildSketch(Plane(origin=(0, 2, 0), x_dir=(1, 0, 0), z_dir=(0, 1, 0))):
        with Locations((-24.3, -17.9)):
            Rectangle(SKETCH_12_W, SKETCH_12_H)
        with Locations((24.3, -17.9)):
            Rectangle(SKETCH_12_W, SKETCH_12_H)
    extrude(amount=-CUT_EXTRUDE_9_DEPTH, mode=Mode.SUBTRACT)

    # 圆角5
    fillet_5_edges = [part.edges().sort_by_distance(p)[0] for p in [
        (20.3, 1, 20),
        (28.3, 1, 20),
        (-20.3, 1, 20),
        (-28.3, 1, 20),
        (-28.3, 1, 15.8),
        (-20.3, 1, 15.8),
        (28.3, 1, 15.8),
        (20.3, 1, 15.8),
    ]]
    fillet(fillet_5_edges, radius=FILLET_5_R)

    # 草图13 → 切除-拉伸10 (cut)
    with BuildSketch(Plane(origin=(0, 2, 0), x_dir=(1, 0, 0), z_dir=(0, 1, 0))):
        Polygon((-36.2, -18), (-36.2, -20), (-36.2, -21), (-37.2, -21), (-37.2, -20), align=None)
        Polygon((36.2, -21), (36.2, -20), (36.2, -18), (37.2, -20), (37.2, -21), align=None)
    extrude(amount=-CUT_EXTRUDE_10_DEPTH, mode=Mode.SUBTRACT)

    # 圆角6
    fillet_6_edges = [part.edges().sort_by_distance(p)[0] for p in [
        (34.7, 1, 20),
        (34.7, 1, 18),
        (36.2, 1, 18),
        (-34.7, 1, 18),
        (-34.7, 1, 20),
        (-36.2, 1, 18),
        (-37.2, 1, 20),
        (-36.2, 1, 21),
        (-37.2, 1, 21),
        (37.2, 1, 21),
        (36.2, 1, 21),
        (37.2, 1, 20),
    ]]
    fillet(fillet_6_edges, radius=FILLET_6_R - 0.0001)  # a hair under: the kernel refuses the full size

    # 圆角7
    fillet_7_edges = [part.edges().sort_by_distance(p)[0] for p in [
        (36.2, 1, 43.5),
        (-36.2, 1, 43.5),
    ]]
    fillet(fillet_7_edges, radius=FILLET_7_R)

    # 草图14 → 切除-拉伸11 (cut)
    with BuildSketch(Plane(origin=(0, 2, 0), x_dir=(1, 0, 0), z_dir=(0, 1, 0))):
        with Locations((-1, -10)):
            Circle(SKETCH_14_R)
        with Locations((1, -10)):
            Circle(SKETCH_14_R)
    extrude(amount=-CUT_EXTRUDE_11_DEPTH, mode=Mode.SUBTRACT)

    # 草图15 → 切除-拉伸12 (cut)
    with BuildSketch(Plane(origin=(0, 2, 0), x_dir=(1, 0, 0), z_dir=(0, 1, 0))):
        with Locations((0, -20.4)):
            Rectangle(SKETCH_15_W, SKETCH_15_H)
    extrude(amount=-CUT_EXTRUDE_12_DEPTH, mode=Mode.SUBTRACT)

    # 草图16 → 凸台-拉伸4 (add)
    with BuildSketch(Plane(origin=(0, 2, 0), x_dir=(1, 0, 0), z_dir=(0, 1, 0))):
        Polygon((-60, -20), (-60, -38), (-67, -37.688888889), (-67, -23.5), (-40, -8), (-20, 0), align=None)
        Polygon((40, -8), (67, -23.5), (67, -37.688888889), (60, -38), (60, -20), (20, 0), align=None)
    extrude(amount=-EXTRUDE_4_DEPTH)

    # 圆角8
    fillet_8_edges = [part.edges().sort_by_distance(p)[0] for p in [
        (-67, 1, 37.688888889),
        (-67, 1, 23.5),
        (67, 1, 23.5),
        (67, 1, 37.688888889),
    ]]
    fillet(fillet_8_edges, radius=FILLET_8_R)

    # 草图17 → 切除-拉伸13 (cut)
    with BuildSketch(Plane(origin=(0, 2, 0), x_dir=(1, 0, 0), z_dir=(0, 1, 0))):
        with Locations(Location((-63, -25.81596743, 0), (0, 0, 270))):
            Circle(SKETCH_17_R)
        with Locations(Location((63, -25.81596743, 0), (0, 0, 270))):
            Circle(SKETCH_17_R)
    extrude(amount=-CUT_EXTRUDE_13_DEPTH, mode=Mode.SUBTRACT)


solid = part.part
